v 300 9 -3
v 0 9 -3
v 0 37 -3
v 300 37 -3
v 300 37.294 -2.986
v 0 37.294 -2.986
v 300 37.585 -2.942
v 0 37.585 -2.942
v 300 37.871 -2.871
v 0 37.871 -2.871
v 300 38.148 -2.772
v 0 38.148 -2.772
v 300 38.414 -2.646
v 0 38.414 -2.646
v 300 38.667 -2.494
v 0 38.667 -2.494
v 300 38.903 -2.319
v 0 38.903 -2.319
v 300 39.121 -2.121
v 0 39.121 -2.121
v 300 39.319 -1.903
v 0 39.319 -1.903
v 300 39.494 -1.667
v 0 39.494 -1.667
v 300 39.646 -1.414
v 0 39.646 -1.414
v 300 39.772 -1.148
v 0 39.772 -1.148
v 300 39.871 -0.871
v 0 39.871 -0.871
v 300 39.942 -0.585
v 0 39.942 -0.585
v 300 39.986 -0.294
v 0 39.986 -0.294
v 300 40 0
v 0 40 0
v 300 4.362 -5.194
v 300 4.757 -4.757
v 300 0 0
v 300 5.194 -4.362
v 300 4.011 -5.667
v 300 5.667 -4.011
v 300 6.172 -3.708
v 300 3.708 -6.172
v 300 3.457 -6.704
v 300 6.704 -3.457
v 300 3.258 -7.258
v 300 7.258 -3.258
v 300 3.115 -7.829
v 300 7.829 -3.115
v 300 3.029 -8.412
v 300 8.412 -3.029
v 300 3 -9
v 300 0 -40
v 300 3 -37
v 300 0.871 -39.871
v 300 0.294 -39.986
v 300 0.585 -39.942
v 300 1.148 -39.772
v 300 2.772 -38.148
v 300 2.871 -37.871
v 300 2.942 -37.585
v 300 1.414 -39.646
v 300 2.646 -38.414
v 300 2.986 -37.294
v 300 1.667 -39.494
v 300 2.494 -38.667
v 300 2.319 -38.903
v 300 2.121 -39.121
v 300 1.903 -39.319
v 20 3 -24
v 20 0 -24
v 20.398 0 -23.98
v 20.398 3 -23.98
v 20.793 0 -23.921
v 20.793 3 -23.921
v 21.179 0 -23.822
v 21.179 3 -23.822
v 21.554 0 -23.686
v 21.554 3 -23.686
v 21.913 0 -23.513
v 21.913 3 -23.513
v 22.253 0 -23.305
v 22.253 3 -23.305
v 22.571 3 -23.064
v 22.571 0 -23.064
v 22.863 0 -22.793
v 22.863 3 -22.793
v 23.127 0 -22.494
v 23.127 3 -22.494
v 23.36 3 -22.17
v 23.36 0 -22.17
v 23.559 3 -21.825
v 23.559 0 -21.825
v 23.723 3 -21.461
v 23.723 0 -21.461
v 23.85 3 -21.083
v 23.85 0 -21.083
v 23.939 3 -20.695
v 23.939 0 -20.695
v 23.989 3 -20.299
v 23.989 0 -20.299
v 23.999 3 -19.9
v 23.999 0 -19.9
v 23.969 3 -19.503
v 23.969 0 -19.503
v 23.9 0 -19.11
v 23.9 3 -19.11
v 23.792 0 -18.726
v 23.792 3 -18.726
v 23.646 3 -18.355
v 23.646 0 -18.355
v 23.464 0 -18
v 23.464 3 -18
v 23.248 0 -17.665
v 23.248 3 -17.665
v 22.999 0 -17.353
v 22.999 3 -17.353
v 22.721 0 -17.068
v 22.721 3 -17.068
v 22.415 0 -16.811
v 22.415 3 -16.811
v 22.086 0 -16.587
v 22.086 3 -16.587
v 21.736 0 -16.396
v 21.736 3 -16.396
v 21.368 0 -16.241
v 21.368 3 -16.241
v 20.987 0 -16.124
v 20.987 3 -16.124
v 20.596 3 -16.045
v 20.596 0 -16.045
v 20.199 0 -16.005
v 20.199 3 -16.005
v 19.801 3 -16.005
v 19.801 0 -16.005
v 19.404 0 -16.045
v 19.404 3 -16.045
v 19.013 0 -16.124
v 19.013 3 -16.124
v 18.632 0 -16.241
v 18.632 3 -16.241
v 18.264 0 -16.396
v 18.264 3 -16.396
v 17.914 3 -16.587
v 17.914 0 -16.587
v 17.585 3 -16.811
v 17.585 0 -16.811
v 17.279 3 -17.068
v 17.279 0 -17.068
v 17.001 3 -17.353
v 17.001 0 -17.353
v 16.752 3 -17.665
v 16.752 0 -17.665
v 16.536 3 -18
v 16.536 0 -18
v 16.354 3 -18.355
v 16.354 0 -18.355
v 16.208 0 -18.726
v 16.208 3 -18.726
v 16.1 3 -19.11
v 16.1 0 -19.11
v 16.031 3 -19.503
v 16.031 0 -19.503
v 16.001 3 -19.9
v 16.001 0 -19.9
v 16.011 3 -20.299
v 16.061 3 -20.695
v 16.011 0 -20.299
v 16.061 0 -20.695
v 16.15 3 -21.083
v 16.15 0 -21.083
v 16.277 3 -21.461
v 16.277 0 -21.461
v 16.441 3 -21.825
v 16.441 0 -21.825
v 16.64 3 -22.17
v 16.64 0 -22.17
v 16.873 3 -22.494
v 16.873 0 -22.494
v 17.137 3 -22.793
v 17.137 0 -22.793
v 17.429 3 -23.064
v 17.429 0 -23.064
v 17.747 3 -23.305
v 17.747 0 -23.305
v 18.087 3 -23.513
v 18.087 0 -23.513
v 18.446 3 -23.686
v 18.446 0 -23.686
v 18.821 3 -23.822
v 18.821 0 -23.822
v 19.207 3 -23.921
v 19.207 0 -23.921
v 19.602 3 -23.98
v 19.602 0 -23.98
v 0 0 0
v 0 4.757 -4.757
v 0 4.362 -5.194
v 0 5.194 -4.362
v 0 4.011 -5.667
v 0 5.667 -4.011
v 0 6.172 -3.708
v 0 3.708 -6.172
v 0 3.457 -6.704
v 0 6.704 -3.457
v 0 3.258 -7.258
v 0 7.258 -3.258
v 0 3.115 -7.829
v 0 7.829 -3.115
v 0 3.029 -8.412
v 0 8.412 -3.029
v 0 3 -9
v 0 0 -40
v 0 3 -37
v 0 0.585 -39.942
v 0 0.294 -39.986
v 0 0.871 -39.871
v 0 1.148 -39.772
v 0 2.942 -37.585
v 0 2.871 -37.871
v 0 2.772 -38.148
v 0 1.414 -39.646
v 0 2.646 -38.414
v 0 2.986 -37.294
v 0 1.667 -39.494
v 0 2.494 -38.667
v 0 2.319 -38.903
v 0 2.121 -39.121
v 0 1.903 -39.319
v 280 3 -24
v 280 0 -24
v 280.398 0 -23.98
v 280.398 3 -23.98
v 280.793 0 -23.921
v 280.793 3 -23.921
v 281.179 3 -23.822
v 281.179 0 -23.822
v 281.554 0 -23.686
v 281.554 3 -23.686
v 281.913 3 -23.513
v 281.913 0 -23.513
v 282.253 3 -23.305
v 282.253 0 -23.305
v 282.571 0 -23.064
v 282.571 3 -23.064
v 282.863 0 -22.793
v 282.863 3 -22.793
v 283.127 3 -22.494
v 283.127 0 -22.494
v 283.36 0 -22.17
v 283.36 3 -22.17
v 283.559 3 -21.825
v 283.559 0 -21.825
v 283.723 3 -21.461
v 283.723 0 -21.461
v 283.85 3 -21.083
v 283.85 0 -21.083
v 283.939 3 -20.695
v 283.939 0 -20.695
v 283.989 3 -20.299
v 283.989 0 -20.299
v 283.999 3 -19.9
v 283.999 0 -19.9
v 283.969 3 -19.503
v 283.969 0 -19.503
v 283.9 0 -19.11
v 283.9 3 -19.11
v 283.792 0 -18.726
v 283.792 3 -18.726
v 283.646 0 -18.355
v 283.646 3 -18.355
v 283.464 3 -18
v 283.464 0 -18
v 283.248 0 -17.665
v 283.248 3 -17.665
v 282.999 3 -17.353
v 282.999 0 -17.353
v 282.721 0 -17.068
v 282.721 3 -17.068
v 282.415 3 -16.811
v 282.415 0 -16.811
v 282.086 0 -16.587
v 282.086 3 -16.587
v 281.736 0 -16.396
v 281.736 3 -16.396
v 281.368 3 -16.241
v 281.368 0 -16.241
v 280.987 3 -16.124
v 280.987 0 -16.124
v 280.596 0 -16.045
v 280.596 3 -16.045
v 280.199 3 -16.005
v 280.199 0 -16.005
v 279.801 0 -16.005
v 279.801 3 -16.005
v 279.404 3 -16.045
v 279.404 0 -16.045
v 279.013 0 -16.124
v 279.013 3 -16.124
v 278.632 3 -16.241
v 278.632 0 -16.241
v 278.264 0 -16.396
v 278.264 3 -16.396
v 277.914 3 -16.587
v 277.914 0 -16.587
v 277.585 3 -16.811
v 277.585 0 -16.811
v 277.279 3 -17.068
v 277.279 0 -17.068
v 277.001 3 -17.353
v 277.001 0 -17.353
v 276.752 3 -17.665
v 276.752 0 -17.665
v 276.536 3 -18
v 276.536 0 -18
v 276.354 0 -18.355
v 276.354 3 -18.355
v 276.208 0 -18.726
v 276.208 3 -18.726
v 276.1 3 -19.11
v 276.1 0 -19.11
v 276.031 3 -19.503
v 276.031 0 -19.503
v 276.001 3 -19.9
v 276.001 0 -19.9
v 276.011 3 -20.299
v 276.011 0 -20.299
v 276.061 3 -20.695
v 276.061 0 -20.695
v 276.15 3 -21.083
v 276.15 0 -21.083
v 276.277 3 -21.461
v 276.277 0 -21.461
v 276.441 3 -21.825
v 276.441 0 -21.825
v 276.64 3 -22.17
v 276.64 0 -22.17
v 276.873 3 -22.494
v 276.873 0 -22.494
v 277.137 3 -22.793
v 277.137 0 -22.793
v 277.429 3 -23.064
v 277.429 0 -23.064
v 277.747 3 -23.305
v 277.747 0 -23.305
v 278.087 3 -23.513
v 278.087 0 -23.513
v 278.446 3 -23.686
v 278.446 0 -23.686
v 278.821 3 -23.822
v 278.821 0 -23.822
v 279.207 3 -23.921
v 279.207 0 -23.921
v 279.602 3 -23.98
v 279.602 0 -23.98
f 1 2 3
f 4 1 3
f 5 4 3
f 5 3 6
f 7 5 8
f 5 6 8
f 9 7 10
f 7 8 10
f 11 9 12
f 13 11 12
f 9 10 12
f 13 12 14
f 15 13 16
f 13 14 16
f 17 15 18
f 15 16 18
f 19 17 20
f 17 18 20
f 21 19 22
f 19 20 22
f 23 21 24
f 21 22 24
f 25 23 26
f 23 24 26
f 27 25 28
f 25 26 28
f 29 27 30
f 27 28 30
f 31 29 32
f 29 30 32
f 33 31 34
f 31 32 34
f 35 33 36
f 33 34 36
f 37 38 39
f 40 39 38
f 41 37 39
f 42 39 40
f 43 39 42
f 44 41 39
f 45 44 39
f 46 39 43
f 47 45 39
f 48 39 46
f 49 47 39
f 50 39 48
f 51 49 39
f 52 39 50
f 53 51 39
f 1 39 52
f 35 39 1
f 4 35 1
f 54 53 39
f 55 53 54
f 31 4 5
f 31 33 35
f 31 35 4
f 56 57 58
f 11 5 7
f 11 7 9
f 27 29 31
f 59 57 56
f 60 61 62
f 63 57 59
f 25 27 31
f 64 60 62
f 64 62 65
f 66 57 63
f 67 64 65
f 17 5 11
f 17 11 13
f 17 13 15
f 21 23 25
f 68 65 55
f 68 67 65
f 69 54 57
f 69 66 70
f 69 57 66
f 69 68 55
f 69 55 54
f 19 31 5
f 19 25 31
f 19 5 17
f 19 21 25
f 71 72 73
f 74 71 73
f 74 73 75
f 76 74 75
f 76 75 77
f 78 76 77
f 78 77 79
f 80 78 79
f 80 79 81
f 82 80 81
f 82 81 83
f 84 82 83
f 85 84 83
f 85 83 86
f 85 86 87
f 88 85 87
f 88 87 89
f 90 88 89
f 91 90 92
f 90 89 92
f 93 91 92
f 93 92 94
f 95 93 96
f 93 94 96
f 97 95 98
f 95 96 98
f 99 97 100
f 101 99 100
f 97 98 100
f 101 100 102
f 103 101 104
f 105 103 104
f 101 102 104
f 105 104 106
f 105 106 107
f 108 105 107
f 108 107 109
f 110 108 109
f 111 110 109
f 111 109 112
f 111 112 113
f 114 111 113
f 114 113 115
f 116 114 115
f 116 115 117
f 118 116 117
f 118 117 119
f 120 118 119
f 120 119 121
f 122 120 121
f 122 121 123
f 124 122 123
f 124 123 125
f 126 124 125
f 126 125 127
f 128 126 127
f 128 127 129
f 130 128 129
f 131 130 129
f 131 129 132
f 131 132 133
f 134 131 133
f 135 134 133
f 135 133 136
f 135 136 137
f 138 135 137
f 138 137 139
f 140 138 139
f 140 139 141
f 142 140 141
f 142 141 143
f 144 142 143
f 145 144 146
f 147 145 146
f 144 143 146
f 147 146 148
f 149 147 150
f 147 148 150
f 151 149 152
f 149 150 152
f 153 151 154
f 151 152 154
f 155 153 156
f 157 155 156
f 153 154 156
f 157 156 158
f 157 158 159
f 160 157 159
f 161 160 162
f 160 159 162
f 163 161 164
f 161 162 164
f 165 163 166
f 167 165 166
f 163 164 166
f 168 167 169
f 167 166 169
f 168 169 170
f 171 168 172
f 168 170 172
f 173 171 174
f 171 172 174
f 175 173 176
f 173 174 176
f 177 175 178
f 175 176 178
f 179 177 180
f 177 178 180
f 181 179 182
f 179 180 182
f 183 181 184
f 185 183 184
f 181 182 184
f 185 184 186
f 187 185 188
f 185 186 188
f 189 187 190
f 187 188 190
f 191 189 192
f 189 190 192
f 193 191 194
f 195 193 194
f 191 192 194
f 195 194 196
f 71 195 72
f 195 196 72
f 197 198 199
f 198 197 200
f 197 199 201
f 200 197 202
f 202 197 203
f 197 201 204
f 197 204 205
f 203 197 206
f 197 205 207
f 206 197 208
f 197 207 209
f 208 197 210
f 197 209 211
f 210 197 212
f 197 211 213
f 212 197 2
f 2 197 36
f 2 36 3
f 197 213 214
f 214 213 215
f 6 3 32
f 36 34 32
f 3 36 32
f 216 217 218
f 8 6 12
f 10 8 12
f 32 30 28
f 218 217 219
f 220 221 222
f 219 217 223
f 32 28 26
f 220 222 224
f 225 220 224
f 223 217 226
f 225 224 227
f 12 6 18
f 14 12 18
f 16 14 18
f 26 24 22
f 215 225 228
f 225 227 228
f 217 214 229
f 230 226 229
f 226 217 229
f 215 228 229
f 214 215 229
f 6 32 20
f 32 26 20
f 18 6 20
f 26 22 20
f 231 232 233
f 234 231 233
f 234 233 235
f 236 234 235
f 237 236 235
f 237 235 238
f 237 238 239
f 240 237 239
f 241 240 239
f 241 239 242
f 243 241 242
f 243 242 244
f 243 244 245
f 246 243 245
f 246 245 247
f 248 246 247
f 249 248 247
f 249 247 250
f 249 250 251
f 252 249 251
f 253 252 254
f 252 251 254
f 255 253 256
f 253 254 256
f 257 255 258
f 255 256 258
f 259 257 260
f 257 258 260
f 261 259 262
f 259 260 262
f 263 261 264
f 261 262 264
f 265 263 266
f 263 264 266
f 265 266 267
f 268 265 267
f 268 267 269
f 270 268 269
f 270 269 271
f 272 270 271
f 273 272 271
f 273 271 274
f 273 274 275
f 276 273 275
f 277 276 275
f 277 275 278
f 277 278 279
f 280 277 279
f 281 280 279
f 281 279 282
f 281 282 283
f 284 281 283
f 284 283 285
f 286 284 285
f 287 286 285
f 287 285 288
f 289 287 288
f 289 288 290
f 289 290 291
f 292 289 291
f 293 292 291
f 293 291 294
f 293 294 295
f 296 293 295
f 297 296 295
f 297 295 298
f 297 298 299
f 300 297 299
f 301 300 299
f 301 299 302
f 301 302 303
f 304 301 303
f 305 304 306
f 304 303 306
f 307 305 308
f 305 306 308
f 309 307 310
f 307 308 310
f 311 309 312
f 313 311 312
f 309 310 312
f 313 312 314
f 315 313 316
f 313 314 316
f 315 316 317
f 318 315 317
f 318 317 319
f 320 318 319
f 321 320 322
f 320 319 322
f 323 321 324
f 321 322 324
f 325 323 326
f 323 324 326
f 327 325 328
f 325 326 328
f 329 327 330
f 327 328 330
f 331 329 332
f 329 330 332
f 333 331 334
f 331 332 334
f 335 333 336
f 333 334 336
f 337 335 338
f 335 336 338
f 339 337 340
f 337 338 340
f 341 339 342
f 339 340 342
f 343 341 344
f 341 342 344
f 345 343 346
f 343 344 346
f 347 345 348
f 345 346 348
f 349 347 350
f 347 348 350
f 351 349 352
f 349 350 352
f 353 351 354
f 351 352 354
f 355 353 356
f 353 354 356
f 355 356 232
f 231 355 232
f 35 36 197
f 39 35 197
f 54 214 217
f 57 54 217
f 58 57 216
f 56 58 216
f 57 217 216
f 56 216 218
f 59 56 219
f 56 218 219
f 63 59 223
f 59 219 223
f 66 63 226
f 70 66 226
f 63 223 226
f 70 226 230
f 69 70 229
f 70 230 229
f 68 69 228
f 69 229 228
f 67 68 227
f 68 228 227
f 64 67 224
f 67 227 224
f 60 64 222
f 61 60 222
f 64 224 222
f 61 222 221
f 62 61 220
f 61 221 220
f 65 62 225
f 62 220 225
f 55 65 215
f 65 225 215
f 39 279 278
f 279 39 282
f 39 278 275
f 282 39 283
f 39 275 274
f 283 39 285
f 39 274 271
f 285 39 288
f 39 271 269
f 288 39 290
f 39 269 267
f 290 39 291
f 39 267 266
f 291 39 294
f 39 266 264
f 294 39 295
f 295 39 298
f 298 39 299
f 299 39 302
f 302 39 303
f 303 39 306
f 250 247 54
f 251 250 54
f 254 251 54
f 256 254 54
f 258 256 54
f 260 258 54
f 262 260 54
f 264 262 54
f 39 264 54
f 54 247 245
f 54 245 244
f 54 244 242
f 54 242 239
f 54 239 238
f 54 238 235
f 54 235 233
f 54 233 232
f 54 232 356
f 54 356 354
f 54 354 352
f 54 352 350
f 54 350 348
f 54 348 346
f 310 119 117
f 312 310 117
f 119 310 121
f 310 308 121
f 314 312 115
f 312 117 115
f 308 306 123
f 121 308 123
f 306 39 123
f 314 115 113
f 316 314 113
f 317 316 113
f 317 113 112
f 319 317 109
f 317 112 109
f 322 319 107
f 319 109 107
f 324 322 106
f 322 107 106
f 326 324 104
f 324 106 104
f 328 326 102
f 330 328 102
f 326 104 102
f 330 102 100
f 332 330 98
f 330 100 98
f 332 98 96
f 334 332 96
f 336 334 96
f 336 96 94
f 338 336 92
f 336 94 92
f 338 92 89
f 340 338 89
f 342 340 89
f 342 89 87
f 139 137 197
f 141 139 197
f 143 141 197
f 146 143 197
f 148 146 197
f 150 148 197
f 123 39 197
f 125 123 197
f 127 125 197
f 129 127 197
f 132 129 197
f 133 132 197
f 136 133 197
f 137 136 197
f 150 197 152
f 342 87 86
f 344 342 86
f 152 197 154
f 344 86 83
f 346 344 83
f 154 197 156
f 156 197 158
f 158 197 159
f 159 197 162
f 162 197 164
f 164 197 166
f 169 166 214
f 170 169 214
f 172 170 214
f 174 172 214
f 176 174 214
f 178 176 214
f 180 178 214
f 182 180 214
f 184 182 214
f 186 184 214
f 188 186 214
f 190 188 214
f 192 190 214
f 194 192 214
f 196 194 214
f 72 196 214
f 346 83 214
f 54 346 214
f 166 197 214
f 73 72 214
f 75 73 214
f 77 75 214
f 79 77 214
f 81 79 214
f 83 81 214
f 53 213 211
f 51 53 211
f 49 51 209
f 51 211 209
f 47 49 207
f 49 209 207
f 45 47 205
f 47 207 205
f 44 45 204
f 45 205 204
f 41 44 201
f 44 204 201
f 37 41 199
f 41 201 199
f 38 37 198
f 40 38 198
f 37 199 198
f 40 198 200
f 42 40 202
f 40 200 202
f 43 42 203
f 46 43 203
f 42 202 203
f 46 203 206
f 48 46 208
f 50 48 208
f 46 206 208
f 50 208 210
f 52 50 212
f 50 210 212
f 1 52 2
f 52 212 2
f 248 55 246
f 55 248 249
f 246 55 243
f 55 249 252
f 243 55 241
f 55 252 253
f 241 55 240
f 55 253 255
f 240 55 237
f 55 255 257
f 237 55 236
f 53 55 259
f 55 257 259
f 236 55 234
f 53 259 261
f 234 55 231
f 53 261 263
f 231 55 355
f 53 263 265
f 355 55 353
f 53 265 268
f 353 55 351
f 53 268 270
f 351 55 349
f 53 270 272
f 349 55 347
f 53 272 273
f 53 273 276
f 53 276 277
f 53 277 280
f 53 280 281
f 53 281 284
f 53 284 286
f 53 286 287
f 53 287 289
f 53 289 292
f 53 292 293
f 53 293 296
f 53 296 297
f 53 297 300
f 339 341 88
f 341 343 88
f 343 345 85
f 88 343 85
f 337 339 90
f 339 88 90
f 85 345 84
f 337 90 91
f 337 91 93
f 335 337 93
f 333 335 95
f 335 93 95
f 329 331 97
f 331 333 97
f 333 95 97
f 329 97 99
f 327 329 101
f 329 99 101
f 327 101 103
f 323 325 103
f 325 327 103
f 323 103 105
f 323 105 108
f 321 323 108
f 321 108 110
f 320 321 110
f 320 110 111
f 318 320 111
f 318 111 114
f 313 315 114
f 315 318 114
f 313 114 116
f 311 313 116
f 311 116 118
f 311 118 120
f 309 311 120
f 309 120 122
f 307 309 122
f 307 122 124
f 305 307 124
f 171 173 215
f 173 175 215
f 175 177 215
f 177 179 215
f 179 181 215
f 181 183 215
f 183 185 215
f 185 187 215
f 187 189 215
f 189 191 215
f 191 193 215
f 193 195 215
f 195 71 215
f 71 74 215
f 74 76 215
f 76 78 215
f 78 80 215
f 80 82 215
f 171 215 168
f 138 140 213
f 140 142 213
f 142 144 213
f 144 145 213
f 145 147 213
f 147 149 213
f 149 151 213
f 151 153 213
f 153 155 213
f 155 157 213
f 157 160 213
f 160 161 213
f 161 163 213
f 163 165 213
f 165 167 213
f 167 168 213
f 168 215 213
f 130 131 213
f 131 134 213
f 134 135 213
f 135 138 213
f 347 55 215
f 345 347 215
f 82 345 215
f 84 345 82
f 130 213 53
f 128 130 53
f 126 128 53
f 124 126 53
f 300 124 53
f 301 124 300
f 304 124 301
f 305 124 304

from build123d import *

# Parameters (mm, degrees)
L_ANGLE_EQUAL_40X40X3_3_DEPTH = 300
SKETCH14_R                    = 4
CUT_EXTRUDE1_DEPTH            = 10


with BuildPart() as part:
    # Sketch13 → L angle (equal) 40X40X3(3) (new body)
    with BuildSketch(Plane(origin=(0, 0, 0), x_dir=(0, 0, -1), z_dir=(1, 0, 0))):
        with BuildLine():
            Line((0, 40), (0, 0))
            Line((0, 0), (40, 0))
            ThreePointArc((40, 0), (39.121320344, 2.121320344), (37, 3))
            Line((37, 3), (9, 3))
            ThreePointArc((9, 3), (4.757359313, 4.757359313), (3, 9))
            Line((3, 9), (3, 37))
            ThreePointArc((3, 37), (2.121320344, 39.121320344), (0, 40))
        make_face()
    extrude(amount=L_ANGLE_EQUAL_40X40X3_3_DEPTH)

    # Sketch14 → Cut-Extrude1 (cut)
    with BuildSketch(Plane(origin=(0, 0, 0), x_dir=(-1, 0, 0), z_dir=(0, -1, 0))):
        with Locations(Location((-280, 20, 0), (0, 0, 90))):
            Circle(SKETCH14_R)
        with Locations(Location((-20, 20, 0), (0, 0, 90))):
            Circle(SKETCH14_R)
    extrude(amount=-CUT_EXTRUDE1_DEPTH, mode=Mode.SUBTRACT)


solid = part.part
